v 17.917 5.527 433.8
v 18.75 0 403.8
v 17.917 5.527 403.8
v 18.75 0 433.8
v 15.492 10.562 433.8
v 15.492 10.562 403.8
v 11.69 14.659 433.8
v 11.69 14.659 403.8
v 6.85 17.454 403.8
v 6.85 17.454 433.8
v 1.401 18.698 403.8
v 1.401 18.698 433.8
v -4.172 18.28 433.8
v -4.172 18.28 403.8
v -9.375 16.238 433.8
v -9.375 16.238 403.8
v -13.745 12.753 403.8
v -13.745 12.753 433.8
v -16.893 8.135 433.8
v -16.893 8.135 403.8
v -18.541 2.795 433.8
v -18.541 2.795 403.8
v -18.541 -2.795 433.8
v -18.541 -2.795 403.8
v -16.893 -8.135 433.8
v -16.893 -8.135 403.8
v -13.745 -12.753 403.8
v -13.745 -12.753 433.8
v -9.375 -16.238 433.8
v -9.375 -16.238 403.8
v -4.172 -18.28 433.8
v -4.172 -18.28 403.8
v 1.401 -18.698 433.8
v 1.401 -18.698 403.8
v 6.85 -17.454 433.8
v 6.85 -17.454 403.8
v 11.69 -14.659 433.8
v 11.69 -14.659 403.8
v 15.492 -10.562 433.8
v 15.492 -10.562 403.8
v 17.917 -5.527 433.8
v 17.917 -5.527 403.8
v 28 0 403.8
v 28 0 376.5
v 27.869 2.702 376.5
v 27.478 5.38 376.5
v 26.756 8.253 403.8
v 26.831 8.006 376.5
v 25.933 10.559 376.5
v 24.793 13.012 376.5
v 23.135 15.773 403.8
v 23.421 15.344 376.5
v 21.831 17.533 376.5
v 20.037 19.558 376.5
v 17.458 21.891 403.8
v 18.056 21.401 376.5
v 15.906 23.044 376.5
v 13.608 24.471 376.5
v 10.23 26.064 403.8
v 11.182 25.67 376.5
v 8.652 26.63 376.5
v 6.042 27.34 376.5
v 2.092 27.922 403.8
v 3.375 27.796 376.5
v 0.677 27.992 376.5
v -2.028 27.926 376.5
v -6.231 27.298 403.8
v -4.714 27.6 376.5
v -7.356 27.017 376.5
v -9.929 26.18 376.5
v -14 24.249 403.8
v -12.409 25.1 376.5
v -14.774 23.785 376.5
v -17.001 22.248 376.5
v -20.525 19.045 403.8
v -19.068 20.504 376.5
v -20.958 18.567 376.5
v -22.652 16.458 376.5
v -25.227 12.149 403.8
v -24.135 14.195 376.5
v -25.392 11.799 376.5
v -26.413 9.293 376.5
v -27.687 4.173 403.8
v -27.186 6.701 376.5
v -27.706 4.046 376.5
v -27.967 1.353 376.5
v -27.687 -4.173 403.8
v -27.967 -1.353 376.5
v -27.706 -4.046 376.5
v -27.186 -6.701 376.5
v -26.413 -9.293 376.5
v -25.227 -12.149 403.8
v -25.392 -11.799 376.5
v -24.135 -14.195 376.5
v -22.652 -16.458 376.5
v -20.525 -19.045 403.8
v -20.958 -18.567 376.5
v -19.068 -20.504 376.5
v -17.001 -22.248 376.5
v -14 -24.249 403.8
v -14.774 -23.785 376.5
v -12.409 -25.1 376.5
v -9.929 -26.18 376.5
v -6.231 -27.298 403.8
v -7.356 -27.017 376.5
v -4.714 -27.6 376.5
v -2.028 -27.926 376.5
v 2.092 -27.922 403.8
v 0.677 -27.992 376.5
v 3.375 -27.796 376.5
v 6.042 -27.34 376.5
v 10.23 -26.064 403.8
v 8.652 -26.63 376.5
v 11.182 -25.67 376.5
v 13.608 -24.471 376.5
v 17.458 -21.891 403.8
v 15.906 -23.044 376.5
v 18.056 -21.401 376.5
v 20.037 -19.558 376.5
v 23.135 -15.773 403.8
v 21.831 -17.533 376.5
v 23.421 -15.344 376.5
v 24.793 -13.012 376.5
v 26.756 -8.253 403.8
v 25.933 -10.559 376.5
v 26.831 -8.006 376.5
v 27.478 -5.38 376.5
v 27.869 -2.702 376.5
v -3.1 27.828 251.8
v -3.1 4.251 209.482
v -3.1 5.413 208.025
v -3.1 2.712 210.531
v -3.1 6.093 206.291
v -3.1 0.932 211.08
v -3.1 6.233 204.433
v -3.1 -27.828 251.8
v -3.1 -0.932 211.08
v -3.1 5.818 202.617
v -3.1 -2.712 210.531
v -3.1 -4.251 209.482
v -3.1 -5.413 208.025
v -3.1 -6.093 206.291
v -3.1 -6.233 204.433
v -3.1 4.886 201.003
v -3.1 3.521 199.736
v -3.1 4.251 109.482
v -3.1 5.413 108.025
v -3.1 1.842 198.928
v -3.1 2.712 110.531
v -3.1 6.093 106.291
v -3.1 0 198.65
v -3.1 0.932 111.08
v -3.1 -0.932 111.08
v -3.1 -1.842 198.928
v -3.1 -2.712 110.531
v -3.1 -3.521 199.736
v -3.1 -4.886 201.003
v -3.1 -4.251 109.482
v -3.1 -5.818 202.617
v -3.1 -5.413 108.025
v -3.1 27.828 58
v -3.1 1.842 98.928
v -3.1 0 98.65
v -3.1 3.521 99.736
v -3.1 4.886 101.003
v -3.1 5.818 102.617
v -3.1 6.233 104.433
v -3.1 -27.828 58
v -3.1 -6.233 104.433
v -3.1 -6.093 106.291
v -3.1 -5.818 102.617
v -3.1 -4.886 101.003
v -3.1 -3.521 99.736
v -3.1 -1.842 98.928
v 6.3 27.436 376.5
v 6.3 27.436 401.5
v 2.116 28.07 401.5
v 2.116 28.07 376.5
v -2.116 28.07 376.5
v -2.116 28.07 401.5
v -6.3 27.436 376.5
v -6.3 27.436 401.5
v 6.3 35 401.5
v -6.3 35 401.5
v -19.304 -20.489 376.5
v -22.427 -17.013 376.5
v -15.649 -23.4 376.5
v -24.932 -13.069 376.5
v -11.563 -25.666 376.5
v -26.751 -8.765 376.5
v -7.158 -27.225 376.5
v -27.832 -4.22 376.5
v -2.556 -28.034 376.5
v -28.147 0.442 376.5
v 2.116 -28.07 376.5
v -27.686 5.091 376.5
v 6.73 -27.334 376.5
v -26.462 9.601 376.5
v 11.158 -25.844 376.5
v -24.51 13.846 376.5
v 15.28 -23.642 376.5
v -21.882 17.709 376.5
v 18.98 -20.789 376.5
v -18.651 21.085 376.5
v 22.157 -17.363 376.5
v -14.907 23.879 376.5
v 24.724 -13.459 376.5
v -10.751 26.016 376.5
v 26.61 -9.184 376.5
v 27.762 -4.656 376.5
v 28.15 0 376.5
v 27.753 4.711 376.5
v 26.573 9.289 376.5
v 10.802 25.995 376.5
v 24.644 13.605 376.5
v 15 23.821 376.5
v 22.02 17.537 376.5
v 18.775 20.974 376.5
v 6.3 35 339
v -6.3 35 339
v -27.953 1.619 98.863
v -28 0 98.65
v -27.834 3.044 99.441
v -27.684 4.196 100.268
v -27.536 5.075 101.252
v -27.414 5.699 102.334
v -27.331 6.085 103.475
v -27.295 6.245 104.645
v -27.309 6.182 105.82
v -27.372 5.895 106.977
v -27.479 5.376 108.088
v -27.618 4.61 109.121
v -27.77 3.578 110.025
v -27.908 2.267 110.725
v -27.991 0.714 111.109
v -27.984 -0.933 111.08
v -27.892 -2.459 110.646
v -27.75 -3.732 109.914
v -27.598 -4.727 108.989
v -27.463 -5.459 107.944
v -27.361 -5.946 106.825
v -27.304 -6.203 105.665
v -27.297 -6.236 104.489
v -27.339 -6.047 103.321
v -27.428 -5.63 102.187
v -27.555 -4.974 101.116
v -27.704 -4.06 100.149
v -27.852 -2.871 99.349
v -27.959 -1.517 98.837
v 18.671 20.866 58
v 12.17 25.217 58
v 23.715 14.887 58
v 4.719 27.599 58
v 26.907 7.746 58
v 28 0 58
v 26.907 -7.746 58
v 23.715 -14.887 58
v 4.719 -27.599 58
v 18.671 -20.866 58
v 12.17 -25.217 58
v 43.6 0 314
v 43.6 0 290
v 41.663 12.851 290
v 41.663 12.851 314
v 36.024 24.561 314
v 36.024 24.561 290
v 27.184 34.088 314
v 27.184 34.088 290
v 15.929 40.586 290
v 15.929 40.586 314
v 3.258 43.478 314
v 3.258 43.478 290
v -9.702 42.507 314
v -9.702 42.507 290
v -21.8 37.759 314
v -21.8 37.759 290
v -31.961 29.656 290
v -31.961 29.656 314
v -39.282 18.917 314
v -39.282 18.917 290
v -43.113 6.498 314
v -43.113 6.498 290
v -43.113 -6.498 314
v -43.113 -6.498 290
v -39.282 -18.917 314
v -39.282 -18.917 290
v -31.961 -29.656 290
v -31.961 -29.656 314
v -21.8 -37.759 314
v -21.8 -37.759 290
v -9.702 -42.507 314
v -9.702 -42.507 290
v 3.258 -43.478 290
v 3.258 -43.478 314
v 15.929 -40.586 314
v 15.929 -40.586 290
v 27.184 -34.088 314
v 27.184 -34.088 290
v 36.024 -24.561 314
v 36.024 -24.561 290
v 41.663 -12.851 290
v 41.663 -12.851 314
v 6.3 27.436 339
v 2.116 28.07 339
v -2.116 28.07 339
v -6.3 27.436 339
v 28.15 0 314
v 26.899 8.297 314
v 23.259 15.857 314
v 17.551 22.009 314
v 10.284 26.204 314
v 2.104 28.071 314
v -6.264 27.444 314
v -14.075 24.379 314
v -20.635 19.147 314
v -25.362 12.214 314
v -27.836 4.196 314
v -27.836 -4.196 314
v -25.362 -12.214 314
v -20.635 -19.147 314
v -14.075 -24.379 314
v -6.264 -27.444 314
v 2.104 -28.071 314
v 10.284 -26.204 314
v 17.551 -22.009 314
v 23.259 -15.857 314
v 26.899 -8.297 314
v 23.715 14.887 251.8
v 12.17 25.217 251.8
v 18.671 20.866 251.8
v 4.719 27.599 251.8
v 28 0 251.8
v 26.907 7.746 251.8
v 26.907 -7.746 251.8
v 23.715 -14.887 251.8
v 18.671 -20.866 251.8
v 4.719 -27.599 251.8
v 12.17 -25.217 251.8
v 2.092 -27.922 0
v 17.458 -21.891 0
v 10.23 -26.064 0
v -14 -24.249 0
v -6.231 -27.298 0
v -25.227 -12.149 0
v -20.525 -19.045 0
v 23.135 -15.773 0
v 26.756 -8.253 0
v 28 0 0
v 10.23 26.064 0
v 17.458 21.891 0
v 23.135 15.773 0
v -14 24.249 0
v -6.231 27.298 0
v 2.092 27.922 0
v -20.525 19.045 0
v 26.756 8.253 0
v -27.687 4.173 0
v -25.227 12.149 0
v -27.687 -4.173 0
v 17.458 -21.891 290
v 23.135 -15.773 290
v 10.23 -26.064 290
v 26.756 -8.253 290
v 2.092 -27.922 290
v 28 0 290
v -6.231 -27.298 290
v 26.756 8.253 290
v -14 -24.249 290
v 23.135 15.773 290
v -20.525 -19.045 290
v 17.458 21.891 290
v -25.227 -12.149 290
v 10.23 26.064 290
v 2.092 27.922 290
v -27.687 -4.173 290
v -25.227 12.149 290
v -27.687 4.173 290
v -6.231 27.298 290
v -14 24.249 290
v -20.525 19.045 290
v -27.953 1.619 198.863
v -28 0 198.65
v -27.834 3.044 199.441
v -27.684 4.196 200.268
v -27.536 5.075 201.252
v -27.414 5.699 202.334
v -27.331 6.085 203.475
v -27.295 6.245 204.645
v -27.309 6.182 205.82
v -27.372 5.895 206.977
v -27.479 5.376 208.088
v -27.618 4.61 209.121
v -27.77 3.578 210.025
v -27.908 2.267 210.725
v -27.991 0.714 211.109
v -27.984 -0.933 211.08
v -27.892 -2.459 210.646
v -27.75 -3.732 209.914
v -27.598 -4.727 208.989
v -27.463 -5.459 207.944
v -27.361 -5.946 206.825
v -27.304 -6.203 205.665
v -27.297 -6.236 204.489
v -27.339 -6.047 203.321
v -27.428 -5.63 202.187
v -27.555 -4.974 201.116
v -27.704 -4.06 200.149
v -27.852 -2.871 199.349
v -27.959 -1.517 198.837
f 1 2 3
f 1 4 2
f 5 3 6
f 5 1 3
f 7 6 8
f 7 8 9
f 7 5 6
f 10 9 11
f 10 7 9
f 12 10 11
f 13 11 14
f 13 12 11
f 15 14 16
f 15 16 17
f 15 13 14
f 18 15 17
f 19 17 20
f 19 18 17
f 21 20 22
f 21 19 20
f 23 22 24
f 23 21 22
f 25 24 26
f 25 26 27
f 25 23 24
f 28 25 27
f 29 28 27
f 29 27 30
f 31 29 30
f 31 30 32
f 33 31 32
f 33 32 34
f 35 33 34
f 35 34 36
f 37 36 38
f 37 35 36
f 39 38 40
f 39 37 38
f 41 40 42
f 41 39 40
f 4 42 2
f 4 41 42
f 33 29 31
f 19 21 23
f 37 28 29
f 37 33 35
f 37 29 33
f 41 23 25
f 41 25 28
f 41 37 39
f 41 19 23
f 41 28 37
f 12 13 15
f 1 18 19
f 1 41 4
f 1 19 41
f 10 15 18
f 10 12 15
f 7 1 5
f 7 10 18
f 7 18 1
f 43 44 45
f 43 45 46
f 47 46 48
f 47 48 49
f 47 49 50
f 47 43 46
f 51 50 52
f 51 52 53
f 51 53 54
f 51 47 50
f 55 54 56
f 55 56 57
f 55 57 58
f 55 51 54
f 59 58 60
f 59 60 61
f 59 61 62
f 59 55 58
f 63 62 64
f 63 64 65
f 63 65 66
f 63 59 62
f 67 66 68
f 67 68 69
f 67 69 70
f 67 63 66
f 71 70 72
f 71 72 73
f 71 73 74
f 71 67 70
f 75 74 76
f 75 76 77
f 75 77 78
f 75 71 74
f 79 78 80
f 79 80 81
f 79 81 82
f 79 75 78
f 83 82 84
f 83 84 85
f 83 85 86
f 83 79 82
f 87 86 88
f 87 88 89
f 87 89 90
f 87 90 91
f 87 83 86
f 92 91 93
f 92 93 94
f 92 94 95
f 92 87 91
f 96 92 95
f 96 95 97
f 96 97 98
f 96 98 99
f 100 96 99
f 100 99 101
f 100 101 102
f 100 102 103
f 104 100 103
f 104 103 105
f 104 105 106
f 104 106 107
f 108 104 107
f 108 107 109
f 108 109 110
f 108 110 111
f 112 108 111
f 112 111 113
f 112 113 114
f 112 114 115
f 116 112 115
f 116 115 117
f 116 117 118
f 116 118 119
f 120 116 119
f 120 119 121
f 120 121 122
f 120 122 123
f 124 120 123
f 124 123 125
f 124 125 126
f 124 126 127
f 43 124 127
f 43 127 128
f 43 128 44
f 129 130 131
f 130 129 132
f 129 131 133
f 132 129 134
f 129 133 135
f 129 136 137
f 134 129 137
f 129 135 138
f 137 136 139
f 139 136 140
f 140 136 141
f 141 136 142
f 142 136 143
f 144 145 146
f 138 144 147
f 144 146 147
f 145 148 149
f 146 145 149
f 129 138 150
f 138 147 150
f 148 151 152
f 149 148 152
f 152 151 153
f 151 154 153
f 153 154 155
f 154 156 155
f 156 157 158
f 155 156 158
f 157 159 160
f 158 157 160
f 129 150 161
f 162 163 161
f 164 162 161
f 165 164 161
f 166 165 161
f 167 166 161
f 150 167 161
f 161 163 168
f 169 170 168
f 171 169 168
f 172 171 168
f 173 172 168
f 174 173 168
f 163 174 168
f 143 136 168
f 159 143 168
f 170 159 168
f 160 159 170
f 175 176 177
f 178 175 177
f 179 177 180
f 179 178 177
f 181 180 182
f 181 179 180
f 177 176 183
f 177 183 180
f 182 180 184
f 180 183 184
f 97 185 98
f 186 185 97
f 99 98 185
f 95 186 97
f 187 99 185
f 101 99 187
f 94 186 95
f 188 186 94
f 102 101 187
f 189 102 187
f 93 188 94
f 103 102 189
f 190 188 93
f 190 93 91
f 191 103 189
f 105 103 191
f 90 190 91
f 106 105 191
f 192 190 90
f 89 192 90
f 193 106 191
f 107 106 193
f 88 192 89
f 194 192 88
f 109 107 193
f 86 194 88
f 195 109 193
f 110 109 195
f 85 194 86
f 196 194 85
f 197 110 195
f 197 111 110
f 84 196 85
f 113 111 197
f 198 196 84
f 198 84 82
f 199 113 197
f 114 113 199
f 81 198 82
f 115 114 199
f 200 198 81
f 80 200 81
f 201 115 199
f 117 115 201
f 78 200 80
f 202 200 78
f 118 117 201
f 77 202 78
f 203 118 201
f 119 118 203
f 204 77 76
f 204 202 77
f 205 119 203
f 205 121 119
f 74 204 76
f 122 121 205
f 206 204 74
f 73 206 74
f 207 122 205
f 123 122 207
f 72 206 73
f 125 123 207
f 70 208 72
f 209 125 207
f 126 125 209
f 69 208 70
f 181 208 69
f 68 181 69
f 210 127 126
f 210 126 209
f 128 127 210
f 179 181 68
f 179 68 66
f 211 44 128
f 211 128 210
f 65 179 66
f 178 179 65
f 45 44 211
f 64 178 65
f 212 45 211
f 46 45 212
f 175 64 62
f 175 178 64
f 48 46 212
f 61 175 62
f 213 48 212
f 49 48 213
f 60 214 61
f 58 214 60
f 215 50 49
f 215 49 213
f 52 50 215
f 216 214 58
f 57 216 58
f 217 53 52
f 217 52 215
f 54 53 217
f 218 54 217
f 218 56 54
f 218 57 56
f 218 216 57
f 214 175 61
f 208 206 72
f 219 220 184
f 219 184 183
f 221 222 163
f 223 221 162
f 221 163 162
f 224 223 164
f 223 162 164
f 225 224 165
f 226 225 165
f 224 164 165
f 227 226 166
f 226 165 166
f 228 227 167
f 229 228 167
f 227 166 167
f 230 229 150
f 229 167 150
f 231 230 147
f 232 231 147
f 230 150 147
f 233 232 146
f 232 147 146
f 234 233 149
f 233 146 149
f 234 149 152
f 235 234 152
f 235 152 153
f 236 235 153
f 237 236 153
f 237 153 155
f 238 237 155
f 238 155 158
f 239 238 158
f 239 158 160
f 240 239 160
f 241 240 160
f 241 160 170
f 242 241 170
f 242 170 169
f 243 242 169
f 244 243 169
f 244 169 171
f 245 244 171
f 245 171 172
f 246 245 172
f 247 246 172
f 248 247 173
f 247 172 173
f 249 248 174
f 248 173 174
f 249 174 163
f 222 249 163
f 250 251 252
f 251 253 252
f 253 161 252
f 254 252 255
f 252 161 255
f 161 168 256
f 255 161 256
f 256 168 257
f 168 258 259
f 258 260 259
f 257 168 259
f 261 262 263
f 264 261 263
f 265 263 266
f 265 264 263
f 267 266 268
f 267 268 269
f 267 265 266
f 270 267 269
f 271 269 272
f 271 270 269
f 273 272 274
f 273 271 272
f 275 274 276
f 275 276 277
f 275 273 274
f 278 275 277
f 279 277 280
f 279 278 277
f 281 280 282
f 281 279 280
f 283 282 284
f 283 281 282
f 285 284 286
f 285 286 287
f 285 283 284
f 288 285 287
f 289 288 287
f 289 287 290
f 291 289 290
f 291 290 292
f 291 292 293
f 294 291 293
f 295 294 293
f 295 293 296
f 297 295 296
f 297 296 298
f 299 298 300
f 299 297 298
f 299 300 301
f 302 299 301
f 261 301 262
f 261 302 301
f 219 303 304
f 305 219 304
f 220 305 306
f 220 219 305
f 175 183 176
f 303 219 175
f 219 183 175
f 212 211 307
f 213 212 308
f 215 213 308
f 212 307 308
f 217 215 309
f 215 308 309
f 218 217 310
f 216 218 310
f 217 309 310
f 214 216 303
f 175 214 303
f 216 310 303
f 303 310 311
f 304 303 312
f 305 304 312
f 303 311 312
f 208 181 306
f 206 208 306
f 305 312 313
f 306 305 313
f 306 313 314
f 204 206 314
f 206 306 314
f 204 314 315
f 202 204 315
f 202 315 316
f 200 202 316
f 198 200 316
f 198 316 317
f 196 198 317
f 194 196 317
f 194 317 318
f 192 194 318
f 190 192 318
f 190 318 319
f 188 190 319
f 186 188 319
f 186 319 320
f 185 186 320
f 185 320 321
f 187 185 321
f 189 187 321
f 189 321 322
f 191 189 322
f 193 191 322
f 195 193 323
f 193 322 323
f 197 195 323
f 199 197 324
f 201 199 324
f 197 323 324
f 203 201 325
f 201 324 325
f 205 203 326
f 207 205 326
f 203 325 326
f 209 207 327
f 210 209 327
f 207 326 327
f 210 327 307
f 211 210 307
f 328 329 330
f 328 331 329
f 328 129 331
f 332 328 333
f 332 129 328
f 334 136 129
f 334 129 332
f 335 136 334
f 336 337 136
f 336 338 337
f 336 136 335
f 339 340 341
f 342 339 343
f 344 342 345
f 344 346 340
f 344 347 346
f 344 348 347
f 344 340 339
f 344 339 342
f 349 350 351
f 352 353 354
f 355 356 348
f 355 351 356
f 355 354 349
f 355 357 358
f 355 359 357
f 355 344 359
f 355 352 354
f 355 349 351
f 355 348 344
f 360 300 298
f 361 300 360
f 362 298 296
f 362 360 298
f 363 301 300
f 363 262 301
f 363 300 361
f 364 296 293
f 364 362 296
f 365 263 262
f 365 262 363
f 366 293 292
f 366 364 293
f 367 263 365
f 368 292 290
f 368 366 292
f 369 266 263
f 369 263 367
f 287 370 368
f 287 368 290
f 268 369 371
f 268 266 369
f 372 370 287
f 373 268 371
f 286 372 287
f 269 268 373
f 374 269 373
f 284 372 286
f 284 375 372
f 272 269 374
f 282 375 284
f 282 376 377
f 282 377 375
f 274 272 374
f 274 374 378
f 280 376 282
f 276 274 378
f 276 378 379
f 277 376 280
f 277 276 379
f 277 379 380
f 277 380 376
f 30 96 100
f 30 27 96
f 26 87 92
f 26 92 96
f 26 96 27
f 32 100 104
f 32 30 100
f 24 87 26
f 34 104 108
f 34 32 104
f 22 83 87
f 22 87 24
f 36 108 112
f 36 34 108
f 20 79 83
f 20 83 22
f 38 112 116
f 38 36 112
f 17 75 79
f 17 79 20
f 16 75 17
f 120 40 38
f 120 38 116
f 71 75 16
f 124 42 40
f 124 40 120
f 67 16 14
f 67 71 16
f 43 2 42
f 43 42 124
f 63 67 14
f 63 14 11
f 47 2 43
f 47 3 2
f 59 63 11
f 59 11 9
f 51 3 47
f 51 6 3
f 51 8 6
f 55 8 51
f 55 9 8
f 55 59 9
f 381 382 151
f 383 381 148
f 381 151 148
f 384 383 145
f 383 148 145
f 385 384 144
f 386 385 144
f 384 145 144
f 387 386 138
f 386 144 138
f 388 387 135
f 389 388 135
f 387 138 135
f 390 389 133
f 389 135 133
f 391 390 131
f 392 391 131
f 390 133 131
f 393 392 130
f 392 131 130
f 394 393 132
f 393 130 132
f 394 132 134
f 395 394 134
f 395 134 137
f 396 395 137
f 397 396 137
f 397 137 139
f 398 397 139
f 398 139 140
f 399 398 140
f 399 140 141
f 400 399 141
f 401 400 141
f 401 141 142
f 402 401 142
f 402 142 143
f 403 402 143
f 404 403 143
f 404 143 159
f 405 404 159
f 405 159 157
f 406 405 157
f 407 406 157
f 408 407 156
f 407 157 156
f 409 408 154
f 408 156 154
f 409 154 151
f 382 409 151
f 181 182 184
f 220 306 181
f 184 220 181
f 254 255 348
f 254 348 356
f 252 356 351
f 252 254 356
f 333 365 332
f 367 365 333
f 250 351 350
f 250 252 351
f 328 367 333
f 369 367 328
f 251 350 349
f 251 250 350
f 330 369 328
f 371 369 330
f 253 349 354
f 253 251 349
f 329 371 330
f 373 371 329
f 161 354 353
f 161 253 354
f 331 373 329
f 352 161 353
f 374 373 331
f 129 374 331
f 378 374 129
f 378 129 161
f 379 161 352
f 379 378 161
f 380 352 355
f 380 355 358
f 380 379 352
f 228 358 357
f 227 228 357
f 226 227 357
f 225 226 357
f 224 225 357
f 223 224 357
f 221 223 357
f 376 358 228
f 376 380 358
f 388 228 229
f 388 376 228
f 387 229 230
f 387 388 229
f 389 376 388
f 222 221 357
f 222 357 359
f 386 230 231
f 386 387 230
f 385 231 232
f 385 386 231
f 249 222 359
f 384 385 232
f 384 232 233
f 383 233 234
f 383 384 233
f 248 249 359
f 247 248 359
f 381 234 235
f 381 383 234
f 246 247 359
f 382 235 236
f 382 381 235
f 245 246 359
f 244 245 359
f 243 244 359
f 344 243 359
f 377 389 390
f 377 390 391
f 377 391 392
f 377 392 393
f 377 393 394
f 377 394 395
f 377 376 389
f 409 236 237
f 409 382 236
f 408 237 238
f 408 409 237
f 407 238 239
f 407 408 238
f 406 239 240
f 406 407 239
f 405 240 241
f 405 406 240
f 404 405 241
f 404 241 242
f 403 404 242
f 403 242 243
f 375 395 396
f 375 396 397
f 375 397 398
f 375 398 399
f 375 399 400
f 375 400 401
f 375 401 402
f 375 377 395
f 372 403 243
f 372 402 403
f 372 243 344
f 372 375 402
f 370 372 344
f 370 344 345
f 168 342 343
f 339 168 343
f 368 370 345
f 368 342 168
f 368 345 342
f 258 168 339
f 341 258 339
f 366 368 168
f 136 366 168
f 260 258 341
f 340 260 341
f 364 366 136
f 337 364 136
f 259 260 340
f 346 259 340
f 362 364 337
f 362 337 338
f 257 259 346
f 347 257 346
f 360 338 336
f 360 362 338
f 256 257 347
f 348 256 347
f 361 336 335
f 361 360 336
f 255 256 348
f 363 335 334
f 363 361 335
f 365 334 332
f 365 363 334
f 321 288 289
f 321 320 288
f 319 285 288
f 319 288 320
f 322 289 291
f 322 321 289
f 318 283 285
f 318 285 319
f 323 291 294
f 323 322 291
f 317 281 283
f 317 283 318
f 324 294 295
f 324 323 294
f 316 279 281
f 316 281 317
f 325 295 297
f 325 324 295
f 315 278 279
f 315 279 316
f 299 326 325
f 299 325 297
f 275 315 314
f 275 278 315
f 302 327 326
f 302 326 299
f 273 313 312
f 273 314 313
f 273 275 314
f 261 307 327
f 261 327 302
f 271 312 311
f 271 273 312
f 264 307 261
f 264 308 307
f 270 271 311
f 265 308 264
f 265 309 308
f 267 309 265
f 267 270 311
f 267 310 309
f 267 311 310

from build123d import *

# Parameters (mm, degrees)
SKETCH2_R               = 28.15
BOSS_EXTRUDE1_DEPTH     = 62.5
BOSS_EXTRUDE2_START     = 25
BOSS_EXTRUDE2_DEPTH     = 62.5
SKETCH5_W               = 31.1
SKETCH5_H               = 193.8
CUT_EXTRUDE1_DEPTH      = 44.6
CUT_EXTRUDE1_DEPTH_BACK = 44.6
SKETCH6_R               = 6.25
CUT_EXTRUDE2_DEPTH      = 41.5


with BuildPart() as part:
    # Sketch1 → Revolve1 (revolve)
    with BuildSketch(Plane(origin=(0, 0, 0), x_dir=(1, 0, 0), z_dir=(0, 1, 0))):
        Polygon((0, 0), (28, 0), (28, -290), (43.6, -290), (43.6, -314), (28, -314), (28, -403.8), (18.75, -403.8), (18.75, -433.8), (0, -433.8), align=None)
    revolve(axis=Axis((0, 0, 0), (0, 0, 1)))

    # Sketch2 → Boss-Extrude1 (add)
    with BuildSketch(Plane.XY.offset(314)):
        Circle(SKETCH2_R)
    extrude(amount=BOSS_EXTRUDE1_DEPTH)

    # Sketch3 → Boss-Extrude2 (add)
    with BuildSketch(Plane.XY.offset(314).offset(BOSS_EXTRUDE2_START)):
        with BuildLine():
            Line((-6.3, 35), (6.3, 35))
            Line((6.3, 35), (6.3, 27.435970914))
            ThreePointArc((6.3, 27.435970914), (0, 28.15), (-6.3, 27.435970914))
            Line((-6.3, 27.435970914), (-6.3, 35))
        make_face()
    extrude(amount=BOSS_EXTRUDE2_DEPTH)

    # Sketch5 → Cut-Extrude1 (cut, two sides)
    with BuildSketch(Plane(origin=(0, 0, 0), x_dir=(1, 0, 0), z_dir=(0, 1, 0))) as cut_extrude1_sk:
        with Locations((12.45, -154.9)):
            Rectangle(SKETCH5_W, SKETCH5_H)
    extrude(amount=CUT_EXTRUDE1_DEPTH, mode=Mode.SUBTRACT)
    extrude(cut_extrude1_sk.sketch, amount=-CUT_EXTRUDE1_DEPTH_BACK, mode=Mode.SUBTRACT)

    # Sketch6 → Cut-Extrude2 (cut, through all)
    with BuildSketch(Plane(origin=(-3.1, 0, 0), x_dir=(0, 0, -1), z_dir=(1, 0, 0))):
        with Locations((-204.9, 0)):
            Circle(SKETCH6_R)
        with Locations((-104.9, 0)):
            Circle(SKETCH6_R)
    extrude(amount=-CUT_EXTRUDE2_DEPTH, mode=Mode.SUBTRACT)


solid = part.part
